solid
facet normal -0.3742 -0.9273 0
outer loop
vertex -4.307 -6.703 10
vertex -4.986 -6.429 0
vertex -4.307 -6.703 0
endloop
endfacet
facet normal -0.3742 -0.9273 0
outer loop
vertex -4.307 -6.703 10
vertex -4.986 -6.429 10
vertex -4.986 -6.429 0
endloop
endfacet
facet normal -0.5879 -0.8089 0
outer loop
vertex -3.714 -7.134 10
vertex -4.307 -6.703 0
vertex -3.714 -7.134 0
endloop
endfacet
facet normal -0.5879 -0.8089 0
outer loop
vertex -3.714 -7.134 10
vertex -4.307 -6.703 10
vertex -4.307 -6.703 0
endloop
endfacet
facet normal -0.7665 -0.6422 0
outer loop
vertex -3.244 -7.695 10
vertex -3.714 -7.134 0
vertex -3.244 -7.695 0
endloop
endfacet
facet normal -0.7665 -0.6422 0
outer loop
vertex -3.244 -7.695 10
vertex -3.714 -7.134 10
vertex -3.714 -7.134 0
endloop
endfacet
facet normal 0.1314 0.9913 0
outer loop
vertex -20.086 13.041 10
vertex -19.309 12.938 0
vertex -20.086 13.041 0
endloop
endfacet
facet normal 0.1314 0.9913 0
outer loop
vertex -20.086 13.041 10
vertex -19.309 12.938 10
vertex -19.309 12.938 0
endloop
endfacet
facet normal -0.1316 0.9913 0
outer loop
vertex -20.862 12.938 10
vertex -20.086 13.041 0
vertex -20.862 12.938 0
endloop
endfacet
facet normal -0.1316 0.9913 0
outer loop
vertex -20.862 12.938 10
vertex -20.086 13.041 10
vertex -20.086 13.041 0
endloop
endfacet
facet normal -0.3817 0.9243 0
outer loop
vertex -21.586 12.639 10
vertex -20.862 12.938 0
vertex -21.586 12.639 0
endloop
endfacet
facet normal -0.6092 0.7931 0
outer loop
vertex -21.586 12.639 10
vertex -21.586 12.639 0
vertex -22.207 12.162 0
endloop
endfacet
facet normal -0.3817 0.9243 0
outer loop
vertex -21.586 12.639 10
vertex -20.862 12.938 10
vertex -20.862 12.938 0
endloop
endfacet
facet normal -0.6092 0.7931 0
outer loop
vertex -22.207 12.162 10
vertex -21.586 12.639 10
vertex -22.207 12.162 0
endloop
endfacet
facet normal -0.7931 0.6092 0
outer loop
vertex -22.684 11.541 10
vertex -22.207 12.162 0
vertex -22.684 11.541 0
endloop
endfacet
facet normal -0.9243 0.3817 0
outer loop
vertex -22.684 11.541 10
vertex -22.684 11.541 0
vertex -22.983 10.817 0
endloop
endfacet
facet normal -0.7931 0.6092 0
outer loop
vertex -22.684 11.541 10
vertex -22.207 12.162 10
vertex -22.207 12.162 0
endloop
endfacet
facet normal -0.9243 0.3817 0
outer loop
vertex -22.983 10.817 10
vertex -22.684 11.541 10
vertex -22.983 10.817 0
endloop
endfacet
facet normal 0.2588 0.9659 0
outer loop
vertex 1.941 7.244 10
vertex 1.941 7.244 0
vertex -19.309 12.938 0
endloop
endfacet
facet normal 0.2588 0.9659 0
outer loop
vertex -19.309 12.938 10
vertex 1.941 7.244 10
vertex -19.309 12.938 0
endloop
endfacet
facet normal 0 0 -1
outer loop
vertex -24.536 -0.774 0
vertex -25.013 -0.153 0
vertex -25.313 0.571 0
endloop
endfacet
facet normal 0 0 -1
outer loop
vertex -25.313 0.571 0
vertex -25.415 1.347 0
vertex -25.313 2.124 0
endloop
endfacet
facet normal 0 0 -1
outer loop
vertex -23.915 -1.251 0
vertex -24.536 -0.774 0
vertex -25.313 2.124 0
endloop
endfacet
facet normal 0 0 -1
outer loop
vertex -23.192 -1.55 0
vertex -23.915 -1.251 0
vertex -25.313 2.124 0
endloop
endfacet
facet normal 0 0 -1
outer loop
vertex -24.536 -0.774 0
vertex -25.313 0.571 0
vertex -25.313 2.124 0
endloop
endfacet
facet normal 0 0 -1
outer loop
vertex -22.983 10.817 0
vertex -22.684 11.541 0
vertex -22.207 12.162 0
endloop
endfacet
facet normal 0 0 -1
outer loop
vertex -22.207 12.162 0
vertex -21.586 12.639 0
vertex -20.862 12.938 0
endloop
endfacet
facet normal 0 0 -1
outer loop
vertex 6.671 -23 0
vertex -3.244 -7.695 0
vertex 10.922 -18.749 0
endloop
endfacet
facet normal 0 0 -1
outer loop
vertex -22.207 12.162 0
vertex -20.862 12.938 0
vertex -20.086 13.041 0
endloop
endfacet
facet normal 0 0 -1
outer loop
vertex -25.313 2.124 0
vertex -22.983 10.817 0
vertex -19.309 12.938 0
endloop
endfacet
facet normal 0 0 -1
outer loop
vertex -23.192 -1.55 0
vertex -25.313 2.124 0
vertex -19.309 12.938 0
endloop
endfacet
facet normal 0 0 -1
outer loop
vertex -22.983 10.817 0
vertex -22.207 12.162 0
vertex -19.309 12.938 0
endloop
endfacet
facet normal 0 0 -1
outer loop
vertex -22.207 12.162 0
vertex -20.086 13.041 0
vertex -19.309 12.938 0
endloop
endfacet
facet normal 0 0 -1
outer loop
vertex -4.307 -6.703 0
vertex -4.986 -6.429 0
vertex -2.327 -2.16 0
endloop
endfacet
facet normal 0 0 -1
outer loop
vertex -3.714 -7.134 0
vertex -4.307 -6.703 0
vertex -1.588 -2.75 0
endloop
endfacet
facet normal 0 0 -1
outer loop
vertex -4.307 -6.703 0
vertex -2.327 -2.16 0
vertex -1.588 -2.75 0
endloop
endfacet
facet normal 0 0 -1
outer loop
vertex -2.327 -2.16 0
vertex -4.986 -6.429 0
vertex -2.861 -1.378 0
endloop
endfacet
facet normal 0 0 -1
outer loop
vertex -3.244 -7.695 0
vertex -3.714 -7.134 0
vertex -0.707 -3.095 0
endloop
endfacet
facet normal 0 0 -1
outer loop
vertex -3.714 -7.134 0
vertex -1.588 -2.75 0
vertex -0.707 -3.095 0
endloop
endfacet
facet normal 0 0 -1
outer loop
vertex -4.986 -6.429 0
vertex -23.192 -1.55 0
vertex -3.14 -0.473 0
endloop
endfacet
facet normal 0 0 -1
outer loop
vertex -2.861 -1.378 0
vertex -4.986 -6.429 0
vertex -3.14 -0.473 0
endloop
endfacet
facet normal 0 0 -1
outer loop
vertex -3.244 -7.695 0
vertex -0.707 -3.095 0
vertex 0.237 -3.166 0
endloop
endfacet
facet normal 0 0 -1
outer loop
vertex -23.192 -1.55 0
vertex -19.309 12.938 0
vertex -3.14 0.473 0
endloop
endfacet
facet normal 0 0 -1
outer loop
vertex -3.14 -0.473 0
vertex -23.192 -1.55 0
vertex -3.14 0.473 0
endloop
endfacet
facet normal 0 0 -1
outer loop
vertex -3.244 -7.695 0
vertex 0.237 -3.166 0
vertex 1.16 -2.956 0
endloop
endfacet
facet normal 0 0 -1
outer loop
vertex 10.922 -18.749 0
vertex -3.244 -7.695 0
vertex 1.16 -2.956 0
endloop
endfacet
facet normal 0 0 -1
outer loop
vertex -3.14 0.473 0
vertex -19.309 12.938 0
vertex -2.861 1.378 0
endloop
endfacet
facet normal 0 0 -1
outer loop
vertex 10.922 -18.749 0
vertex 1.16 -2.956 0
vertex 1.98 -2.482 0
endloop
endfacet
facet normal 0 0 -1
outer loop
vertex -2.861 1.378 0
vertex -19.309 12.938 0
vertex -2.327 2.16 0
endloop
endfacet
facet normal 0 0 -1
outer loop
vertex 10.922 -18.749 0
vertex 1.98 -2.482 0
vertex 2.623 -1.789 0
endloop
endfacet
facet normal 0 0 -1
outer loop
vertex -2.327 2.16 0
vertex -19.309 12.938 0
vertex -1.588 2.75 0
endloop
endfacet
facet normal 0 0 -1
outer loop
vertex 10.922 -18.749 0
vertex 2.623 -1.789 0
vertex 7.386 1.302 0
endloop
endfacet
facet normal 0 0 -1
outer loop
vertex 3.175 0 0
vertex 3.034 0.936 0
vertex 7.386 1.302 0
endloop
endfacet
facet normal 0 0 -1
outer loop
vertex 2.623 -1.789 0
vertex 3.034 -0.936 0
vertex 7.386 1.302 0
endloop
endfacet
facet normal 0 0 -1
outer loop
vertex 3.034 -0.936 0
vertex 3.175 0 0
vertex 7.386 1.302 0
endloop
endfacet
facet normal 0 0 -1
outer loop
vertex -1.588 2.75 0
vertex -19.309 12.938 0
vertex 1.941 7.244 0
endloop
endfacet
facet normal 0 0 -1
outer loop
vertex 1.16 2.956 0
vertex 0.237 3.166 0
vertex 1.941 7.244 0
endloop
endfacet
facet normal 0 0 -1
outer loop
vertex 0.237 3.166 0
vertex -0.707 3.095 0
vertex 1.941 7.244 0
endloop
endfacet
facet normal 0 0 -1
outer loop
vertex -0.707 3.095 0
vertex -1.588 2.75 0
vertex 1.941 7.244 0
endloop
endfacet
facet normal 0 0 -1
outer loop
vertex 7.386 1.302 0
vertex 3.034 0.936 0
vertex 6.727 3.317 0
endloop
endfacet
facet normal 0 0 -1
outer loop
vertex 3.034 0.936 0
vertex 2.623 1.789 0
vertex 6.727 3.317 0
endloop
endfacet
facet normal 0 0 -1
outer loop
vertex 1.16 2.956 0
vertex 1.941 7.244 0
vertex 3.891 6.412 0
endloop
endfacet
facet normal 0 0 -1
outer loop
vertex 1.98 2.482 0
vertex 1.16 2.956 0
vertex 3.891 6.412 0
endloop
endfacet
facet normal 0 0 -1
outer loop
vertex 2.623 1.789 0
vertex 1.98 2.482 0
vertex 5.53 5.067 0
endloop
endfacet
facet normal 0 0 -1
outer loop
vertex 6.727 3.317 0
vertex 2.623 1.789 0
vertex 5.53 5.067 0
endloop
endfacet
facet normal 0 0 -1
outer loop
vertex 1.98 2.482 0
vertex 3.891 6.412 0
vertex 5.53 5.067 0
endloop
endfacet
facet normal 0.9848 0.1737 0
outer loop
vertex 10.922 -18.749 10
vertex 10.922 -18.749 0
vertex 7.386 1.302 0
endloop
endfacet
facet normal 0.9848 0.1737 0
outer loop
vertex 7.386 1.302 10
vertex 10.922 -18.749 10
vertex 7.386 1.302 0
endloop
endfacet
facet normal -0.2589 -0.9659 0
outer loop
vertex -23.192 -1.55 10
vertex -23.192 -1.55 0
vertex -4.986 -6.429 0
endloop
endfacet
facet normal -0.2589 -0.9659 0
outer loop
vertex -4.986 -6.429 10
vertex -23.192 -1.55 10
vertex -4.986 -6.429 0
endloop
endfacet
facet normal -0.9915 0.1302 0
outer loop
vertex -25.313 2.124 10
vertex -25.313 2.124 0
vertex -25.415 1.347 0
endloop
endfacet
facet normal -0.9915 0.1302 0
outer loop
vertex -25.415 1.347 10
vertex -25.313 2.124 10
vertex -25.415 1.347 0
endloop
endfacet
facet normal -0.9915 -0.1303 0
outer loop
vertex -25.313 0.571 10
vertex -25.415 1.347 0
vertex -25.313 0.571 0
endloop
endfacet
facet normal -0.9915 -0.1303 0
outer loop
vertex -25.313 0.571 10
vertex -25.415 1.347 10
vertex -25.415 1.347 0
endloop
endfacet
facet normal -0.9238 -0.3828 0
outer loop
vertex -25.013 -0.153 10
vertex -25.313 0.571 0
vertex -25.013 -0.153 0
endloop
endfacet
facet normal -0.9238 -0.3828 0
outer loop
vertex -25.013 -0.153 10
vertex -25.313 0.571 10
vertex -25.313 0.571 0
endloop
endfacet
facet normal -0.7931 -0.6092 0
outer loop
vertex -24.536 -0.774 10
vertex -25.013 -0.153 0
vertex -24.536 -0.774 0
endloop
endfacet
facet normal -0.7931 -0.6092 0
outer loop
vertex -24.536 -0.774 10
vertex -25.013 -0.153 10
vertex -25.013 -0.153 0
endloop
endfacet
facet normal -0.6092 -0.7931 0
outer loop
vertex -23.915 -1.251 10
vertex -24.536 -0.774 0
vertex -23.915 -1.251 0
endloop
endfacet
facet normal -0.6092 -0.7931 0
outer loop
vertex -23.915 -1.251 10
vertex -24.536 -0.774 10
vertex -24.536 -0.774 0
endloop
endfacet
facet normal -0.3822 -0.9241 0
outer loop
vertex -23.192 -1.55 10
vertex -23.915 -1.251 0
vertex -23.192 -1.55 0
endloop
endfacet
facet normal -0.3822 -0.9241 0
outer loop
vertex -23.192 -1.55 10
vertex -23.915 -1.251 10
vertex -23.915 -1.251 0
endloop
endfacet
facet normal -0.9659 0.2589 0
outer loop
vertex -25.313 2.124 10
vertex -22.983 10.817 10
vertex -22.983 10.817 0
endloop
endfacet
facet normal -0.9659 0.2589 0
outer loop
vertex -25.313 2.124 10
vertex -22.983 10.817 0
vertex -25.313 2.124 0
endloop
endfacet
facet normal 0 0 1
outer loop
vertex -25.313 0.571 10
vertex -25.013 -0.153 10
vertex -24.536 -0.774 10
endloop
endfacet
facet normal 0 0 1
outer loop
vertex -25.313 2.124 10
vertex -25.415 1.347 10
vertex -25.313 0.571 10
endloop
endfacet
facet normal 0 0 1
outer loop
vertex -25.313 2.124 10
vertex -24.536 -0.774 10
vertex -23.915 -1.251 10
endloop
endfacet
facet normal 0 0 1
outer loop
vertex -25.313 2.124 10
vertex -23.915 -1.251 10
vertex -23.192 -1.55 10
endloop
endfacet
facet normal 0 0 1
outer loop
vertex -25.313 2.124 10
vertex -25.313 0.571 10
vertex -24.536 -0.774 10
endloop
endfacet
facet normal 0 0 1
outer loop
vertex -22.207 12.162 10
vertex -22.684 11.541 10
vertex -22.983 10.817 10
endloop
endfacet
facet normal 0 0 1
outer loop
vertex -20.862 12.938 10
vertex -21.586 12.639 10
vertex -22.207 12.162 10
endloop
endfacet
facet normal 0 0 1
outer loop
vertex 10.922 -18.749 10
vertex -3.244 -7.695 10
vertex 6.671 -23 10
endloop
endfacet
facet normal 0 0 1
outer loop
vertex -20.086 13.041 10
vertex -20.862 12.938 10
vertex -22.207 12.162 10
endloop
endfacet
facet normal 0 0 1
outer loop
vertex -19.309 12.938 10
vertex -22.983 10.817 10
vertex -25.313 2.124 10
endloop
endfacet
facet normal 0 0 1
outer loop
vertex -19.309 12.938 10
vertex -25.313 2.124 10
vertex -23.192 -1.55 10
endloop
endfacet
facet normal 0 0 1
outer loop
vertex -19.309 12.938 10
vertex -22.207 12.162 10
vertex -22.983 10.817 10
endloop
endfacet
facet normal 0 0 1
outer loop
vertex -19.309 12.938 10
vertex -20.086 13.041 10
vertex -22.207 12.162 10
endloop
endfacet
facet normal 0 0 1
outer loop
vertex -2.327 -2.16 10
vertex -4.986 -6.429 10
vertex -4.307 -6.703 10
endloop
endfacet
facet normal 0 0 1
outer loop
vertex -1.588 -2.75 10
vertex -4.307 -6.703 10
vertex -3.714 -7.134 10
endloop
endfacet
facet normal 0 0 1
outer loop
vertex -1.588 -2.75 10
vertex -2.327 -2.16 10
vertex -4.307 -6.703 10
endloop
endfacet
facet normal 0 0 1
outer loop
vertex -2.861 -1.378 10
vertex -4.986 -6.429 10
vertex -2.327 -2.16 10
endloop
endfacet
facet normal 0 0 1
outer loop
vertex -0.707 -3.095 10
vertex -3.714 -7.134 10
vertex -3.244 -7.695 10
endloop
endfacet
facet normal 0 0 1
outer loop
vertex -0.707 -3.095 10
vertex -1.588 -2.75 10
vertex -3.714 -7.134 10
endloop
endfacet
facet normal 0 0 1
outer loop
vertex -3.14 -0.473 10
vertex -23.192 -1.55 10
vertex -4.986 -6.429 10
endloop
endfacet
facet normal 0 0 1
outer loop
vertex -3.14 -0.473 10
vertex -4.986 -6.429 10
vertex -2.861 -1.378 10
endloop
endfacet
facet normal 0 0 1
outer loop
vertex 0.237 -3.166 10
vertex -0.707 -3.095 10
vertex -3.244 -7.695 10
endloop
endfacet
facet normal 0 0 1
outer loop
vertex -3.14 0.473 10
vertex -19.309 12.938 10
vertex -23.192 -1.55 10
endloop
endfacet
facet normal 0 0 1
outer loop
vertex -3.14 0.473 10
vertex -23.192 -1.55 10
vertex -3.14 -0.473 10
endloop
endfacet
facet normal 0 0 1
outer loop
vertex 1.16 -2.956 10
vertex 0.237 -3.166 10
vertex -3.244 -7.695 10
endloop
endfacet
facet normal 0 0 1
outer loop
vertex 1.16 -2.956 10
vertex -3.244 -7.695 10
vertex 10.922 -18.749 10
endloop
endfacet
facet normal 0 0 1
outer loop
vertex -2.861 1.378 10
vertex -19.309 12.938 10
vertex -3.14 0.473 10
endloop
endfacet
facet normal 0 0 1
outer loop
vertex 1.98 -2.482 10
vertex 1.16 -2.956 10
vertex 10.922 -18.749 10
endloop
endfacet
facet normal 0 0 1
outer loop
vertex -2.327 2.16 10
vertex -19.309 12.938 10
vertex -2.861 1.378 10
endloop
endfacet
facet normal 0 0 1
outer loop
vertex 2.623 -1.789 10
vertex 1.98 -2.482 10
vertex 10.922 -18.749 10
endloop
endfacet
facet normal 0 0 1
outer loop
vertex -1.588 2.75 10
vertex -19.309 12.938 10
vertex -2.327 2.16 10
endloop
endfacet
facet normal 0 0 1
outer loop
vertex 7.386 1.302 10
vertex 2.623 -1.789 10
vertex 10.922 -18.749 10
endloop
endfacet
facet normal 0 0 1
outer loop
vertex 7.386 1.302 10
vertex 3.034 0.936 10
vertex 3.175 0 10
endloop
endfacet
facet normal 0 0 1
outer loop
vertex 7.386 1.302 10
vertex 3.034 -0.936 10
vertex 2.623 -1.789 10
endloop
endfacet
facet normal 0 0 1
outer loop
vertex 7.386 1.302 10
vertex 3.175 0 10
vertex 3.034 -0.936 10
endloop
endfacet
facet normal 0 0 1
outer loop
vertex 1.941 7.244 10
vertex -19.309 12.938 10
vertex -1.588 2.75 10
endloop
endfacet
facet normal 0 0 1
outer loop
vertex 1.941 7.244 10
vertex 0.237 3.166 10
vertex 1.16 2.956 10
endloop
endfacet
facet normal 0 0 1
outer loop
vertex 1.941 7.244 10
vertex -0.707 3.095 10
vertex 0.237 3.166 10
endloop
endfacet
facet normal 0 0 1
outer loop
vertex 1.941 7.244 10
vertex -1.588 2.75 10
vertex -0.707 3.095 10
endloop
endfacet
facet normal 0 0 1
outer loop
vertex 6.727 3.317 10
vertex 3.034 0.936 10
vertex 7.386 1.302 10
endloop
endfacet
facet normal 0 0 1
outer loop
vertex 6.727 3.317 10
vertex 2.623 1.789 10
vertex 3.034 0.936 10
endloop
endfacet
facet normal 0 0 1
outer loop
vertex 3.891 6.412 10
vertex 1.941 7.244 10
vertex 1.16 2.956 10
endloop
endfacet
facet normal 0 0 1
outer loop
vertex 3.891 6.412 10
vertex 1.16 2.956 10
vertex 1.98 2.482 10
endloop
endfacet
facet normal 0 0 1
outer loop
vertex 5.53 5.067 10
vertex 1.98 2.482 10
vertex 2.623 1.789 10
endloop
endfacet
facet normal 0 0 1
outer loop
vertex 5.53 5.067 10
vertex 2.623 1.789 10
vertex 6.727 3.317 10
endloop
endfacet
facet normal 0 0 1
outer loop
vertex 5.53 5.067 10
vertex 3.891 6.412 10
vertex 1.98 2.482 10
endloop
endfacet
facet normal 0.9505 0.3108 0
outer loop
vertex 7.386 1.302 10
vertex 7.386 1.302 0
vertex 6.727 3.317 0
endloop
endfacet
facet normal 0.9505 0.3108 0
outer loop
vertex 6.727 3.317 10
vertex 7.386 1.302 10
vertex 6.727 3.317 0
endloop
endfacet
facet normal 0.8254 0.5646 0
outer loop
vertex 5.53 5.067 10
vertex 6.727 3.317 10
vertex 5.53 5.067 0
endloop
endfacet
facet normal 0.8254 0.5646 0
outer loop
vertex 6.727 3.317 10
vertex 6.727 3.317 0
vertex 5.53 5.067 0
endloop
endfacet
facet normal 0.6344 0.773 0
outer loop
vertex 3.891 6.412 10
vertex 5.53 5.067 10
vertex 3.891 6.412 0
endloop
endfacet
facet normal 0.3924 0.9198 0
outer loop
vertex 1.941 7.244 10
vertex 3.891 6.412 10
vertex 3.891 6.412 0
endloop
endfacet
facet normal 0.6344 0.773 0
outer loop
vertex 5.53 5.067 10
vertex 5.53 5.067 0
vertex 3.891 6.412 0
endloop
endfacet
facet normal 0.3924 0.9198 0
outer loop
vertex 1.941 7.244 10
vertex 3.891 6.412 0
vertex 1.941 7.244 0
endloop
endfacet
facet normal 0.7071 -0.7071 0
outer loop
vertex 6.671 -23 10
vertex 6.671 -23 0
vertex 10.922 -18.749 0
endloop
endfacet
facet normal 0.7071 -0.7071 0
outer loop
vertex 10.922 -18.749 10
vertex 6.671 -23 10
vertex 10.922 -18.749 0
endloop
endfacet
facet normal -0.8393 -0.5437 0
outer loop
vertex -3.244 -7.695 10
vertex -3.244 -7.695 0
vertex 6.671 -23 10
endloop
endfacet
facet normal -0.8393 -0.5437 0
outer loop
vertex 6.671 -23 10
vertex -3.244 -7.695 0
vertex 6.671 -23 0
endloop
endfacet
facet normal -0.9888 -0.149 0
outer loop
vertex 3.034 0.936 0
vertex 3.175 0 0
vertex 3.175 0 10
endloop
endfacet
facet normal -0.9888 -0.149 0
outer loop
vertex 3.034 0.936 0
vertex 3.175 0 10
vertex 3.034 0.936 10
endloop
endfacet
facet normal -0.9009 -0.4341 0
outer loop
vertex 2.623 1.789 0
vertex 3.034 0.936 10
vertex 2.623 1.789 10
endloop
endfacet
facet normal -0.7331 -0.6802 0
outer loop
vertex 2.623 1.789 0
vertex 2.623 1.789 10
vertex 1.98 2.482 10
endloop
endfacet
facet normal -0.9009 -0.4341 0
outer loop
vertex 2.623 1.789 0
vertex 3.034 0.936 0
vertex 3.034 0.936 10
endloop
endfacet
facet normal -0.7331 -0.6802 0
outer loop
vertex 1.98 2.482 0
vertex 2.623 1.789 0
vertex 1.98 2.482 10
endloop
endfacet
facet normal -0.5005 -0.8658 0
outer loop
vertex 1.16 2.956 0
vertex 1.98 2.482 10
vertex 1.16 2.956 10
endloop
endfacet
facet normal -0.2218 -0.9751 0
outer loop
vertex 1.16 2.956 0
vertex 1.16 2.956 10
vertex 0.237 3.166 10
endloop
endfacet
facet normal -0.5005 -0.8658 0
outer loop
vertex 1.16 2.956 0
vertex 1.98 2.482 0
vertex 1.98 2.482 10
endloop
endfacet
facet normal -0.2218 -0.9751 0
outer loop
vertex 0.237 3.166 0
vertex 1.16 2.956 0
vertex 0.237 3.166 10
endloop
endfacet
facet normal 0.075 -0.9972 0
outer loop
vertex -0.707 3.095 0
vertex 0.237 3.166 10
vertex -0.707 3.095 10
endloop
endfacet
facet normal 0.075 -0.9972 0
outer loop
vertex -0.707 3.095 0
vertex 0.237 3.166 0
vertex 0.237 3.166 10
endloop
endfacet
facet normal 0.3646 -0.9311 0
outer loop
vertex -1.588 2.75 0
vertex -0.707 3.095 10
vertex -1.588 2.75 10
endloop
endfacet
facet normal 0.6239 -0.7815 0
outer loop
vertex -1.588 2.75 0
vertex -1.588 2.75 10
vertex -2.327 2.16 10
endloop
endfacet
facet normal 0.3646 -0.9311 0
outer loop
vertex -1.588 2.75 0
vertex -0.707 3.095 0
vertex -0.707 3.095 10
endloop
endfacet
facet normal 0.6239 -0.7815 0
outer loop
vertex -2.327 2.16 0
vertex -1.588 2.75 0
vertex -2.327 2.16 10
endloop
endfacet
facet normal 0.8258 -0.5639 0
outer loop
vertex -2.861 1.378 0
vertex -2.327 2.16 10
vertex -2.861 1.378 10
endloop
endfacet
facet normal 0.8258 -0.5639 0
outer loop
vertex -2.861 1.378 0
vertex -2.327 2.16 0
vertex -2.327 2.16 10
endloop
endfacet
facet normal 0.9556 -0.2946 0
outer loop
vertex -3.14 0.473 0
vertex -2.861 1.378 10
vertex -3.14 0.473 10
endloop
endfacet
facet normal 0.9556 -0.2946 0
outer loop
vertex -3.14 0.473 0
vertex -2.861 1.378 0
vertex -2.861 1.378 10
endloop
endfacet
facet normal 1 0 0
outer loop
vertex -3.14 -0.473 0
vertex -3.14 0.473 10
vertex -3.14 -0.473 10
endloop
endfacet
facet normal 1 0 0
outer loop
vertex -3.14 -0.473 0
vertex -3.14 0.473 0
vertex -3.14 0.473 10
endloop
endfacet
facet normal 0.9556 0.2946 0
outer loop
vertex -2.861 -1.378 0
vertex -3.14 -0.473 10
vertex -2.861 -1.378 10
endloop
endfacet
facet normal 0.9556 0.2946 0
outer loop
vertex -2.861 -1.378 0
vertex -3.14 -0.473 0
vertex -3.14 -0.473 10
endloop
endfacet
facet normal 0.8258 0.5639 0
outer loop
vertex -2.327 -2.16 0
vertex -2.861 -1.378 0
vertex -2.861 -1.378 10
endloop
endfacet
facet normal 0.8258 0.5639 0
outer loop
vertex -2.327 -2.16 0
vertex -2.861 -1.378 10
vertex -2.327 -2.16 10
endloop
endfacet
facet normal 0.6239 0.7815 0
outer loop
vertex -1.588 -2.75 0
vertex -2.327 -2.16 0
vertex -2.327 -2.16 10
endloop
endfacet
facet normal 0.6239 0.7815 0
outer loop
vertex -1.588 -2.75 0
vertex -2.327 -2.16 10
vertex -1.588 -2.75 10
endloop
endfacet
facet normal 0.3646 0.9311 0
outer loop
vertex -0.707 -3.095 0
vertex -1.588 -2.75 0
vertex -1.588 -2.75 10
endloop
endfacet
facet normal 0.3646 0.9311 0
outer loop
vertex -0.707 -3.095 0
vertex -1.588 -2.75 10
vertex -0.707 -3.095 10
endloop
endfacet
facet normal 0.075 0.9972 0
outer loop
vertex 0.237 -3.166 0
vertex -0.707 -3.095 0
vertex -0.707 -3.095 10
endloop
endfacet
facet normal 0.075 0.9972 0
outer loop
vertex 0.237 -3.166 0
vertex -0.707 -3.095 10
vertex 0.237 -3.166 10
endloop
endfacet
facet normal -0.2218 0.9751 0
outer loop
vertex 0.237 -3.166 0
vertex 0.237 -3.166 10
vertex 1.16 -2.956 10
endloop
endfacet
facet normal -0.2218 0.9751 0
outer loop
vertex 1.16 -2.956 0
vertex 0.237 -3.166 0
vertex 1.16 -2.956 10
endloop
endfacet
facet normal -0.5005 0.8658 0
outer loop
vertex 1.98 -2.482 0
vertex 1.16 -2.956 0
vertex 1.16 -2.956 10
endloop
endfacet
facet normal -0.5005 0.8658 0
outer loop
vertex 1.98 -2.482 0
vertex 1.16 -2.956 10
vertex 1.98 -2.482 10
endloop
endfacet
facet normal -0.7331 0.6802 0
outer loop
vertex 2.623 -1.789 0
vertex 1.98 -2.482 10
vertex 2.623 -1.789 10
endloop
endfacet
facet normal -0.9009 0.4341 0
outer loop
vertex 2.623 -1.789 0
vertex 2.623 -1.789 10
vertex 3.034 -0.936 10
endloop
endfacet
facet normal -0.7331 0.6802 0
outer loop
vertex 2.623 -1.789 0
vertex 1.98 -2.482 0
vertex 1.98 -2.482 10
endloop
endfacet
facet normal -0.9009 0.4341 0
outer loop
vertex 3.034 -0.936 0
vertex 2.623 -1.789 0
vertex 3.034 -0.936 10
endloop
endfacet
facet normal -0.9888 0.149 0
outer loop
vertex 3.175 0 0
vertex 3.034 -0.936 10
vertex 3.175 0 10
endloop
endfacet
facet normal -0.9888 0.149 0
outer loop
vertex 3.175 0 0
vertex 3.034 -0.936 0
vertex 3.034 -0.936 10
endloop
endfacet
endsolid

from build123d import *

# Parameters (mm, degrees)
SKETCH1_R           = 3.175
BOSS_EXTRUDE1_DEPTH = 10
FILLET1_R           = 3


with BuildPart() as part:
    # Sketch1 → Boss-Extrude1 (new body)
    with BuildSketch(Plane.XY):
        with BuildLine():
            Line((1.941142838, 7.244443697), (-22.207002819, 13.714919825))
            Line((-22.207002819, 13.714919825), (-26.089288495, -0.77396757))
            Line((-26.089288495, -0.77396757), (-3.871447622, -6.727220089))
            Line((-3.871447622, -6.727220089), (6.671220145, -23))
            Line((6.671220145, -23), (10.921738991, -18.749481154))
            Line((10.921738991, -18.749481154), (7.386058148, 1.302361333))
            ThreePointArc((7.386058148, 1.302361333), (5.529580026, 5.066926557), (1.941142838, 7.244443697))
        make_face()
        Circle(SKETCH1_R, mode=Mode.SUBTRACT)
    extrude(amount=BOSS_EXTRUDE1_DEPTH)

    # Fillet1
    fillet1_edges = [part.edges().sort_by_distance(p)[0] for p in [
        (-3.871447622, -6.727220089, 5),
        (-26.089288495, -0.77396757, 5),
        (-22.207002819, 13.714919825, 5),
    ]]
    fillet(fillet1_edges, radius=FILLET1_R)


solid = part.part
